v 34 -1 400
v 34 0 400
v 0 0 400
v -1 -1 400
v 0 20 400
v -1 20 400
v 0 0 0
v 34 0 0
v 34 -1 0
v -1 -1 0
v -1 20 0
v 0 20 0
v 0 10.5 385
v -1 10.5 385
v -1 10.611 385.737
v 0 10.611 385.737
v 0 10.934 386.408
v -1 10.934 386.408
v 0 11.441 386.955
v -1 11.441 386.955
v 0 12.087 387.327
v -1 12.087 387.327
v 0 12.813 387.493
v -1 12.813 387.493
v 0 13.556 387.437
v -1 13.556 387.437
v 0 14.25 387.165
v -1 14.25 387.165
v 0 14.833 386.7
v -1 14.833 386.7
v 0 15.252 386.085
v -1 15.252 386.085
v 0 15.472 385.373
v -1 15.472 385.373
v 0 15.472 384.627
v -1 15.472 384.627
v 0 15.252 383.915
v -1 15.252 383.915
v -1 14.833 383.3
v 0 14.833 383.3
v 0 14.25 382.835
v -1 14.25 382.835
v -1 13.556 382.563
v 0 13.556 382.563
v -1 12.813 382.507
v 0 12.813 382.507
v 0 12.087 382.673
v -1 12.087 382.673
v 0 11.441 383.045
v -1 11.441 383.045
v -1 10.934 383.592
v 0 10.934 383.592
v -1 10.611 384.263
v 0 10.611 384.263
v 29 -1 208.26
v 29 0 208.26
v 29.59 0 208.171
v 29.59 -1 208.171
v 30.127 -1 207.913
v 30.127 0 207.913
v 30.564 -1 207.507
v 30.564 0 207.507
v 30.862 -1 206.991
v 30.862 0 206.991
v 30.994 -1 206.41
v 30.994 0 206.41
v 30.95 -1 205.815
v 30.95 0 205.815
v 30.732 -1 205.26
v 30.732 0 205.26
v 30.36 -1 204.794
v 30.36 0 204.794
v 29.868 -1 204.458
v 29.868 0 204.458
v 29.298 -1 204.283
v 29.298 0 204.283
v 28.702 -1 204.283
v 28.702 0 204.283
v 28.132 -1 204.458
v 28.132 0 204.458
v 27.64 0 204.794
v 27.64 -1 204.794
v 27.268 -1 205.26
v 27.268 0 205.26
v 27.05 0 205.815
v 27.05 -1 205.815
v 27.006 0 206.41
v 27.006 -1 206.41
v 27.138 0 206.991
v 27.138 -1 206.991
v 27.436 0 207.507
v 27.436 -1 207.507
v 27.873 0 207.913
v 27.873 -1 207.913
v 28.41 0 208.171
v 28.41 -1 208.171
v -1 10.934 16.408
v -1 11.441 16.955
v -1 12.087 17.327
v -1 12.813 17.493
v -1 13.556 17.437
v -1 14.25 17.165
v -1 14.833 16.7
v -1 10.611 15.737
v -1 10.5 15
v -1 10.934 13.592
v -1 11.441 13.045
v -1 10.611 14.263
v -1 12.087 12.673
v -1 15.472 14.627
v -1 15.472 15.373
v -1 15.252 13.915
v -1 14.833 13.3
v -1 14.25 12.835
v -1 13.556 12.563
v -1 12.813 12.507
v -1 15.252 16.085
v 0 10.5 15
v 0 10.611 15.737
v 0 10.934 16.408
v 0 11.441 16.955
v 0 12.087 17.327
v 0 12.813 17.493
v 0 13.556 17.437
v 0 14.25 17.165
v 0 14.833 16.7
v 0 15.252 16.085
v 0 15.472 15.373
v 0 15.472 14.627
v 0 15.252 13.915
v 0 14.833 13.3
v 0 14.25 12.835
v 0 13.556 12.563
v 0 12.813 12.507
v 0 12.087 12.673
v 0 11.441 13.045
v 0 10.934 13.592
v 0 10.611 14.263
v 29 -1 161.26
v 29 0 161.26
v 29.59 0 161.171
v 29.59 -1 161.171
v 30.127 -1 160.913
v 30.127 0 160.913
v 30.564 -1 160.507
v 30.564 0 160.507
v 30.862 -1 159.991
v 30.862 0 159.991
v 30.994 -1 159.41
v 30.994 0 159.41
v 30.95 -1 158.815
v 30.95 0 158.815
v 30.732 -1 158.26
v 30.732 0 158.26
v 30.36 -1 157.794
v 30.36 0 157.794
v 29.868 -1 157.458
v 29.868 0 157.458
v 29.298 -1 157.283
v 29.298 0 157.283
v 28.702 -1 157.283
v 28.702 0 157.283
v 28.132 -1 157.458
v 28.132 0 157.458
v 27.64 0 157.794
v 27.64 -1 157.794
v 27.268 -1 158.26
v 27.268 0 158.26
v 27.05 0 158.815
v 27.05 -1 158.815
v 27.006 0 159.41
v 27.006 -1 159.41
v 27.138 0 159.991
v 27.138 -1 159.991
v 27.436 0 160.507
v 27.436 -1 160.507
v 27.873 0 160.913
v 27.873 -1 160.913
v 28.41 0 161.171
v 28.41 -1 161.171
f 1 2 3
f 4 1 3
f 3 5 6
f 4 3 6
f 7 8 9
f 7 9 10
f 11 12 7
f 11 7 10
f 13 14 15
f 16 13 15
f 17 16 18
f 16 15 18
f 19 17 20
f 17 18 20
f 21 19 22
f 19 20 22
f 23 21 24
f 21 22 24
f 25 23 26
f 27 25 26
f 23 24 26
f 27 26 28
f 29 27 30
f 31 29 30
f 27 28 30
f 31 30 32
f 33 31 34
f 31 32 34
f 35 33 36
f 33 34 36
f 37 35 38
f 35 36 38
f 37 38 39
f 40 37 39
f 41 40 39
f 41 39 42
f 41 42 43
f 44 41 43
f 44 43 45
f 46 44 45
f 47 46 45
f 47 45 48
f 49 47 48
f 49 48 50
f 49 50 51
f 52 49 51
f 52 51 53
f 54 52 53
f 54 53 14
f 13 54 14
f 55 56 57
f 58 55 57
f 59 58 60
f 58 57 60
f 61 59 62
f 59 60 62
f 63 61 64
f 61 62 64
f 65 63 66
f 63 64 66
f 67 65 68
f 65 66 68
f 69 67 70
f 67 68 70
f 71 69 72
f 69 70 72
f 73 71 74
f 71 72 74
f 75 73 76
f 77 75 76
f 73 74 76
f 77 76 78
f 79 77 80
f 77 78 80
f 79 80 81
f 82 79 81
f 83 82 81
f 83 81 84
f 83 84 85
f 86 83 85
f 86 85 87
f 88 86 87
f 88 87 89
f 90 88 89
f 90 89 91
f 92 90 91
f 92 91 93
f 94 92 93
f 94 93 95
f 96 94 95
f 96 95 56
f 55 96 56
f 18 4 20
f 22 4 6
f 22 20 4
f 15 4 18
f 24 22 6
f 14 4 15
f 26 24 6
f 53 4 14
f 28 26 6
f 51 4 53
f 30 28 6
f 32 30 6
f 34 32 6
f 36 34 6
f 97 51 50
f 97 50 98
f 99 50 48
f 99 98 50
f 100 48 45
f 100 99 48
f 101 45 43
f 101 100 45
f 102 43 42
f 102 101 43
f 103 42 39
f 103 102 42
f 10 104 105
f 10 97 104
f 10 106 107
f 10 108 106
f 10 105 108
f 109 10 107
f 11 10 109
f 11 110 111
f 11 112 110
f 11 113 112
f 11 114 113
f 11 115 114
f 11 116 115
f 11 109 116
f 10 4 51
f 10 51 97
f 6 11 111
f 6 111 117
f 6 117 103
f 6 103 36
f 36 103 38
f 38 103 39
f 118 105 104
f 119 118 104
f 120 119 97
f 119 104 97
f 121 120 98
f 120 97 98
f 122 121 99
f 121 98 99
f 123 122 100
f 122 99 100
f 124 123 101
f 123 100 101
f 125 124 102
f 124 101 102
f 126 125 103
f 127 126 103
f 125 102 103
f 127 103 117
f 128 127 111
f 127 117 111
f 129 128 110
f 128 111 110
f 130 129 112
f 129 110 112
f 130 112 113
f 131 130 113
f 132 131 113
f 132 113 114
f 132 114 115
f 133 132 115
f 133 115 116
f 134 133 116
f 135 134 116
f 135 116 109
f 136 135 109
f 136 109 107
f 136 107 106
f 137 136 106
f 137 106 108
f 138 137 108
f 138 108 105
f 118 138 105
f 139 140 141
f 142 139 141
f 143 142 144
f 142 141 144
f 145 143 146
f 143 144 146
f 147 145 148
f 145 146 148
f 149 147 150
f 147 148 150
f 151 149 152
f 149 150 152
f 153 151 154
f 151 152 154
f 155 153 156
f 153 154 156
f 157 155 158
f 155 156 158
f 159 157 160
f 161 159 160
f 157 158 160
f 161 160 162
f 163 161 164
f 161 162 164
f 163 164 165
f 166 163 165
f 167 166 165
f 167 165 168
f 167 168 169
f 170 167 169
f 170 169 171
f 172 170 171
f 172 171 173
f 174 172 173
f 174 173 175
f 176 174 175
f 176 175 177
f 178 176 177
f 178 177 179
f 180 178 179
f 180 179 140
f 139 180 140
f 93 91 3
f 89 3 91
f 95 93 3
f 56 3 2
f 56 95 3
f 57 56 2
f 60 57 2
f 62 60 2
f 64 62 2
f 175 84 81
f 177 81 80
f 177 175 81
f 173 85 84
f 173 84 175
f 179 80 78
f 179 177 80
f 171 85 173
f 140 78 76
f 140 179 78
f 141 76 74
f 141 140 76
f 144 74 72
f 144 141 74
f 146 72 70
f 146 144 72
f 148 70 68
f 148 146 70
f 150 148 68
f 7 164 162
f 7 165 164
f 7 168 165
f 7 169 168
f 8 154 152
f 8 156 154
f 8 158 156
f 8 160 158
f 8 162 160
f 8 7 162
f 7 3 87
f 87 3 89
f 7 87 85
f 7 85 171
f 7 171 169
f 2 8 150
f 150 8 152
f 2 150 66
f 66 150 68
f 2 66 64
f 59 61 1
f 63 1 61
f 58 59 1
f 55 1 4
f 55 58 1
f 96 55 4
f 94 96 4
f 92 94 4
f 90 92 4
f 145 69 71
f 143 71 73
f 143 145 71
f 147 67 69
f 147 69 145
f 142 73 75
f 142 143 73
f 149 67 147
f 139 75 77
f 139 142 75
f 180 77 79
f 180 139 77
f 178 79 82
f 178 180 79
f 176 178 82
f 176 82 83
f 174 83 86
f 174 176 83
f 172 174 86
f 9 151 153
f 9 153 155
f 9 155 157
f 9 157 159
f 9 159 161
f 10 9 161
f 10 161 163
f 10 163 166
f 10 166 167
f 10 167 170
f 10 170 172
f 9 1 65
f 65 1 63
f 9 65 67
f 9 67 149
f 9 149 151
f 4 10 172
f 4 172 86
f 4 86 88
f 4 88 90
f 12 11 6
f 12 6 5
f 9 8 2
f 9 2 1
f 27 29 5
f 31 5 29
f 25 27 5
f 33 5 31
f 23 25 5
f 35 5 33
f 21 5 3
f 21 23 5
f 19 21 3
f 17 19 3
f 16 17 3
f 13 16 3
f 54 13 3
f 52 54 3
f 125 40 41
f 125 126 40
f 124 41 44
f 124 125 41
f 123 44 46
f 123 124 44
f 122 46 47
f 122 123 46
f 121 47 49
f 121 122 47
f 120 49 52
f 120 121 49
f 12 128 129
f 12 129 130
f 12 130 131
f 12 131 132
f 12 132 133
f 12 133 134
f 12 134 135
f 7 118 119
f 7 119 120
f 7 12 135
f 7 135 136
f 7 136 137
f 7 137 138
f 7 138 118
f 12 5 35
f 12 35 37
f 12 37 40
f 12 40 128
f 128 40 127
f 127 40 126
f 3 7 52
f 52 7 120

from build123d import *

# Parameters (mm, degrees)
BOSS_EXTRU_1_DEPTH      = 400
ESQUISSE3_R             = 2
ENL_V_MAT_EXTRU_2_DEPTH = 402.940294074
ESQUISSE4_R             = 2.5
ENL_V_MAT_EXTRU_3_DEPTH = 10


with BuildPart() as part:
    # Esquisse1 → Boss.-Extru.1 (new body)
    with BuildSketch(Plane.XY):
        Polygon((-1, -1), (-1, 20), (0, 20), (0, 0), (34, 0), (34, -1), align=None)
    extrude(amount=BOSS_EXTRU_1_DEPTH)

    # Esquisse3 → Enlèv. mat.-Extru.2 (cut, through all)
    with BuildSketch(Plane(origin=(0, 0, 0), x_dir=(1, 0, 0), z_dir=(0, 1, 0))):
        with Locations(Location((29, -206.260283716, 0), (0, 0, 270))):
            Circle(ESQUISSE3_R)
        with Locations(Location((29, -159.260283716, 0), (0, 0, 270))):
            Circle(ESQUISSE3_R)
    extrude(amount=-ENL_V_MAT_EXTRU_2_DEPTH, mode=Mode.SUBTRACT)

    # Esquisse4 → Enlèv. mat.-Extru.3 (cut)
    with BuildSketch(Plane.ZY.offset(1)):
        with Locations(Location((15, 13, 0), (0, 0, 270))):
            Circle(ESQUISSE4_R)
        with Locations(Location((385, 13, 0), (0, 0, 270))):
            Circle(ESQUISSE4_R)
    extrude(amount=-ENL_V_MAT_EXTRU_3_DEPTH, mode=Mode.SUBTRACT)


solid = part.part
